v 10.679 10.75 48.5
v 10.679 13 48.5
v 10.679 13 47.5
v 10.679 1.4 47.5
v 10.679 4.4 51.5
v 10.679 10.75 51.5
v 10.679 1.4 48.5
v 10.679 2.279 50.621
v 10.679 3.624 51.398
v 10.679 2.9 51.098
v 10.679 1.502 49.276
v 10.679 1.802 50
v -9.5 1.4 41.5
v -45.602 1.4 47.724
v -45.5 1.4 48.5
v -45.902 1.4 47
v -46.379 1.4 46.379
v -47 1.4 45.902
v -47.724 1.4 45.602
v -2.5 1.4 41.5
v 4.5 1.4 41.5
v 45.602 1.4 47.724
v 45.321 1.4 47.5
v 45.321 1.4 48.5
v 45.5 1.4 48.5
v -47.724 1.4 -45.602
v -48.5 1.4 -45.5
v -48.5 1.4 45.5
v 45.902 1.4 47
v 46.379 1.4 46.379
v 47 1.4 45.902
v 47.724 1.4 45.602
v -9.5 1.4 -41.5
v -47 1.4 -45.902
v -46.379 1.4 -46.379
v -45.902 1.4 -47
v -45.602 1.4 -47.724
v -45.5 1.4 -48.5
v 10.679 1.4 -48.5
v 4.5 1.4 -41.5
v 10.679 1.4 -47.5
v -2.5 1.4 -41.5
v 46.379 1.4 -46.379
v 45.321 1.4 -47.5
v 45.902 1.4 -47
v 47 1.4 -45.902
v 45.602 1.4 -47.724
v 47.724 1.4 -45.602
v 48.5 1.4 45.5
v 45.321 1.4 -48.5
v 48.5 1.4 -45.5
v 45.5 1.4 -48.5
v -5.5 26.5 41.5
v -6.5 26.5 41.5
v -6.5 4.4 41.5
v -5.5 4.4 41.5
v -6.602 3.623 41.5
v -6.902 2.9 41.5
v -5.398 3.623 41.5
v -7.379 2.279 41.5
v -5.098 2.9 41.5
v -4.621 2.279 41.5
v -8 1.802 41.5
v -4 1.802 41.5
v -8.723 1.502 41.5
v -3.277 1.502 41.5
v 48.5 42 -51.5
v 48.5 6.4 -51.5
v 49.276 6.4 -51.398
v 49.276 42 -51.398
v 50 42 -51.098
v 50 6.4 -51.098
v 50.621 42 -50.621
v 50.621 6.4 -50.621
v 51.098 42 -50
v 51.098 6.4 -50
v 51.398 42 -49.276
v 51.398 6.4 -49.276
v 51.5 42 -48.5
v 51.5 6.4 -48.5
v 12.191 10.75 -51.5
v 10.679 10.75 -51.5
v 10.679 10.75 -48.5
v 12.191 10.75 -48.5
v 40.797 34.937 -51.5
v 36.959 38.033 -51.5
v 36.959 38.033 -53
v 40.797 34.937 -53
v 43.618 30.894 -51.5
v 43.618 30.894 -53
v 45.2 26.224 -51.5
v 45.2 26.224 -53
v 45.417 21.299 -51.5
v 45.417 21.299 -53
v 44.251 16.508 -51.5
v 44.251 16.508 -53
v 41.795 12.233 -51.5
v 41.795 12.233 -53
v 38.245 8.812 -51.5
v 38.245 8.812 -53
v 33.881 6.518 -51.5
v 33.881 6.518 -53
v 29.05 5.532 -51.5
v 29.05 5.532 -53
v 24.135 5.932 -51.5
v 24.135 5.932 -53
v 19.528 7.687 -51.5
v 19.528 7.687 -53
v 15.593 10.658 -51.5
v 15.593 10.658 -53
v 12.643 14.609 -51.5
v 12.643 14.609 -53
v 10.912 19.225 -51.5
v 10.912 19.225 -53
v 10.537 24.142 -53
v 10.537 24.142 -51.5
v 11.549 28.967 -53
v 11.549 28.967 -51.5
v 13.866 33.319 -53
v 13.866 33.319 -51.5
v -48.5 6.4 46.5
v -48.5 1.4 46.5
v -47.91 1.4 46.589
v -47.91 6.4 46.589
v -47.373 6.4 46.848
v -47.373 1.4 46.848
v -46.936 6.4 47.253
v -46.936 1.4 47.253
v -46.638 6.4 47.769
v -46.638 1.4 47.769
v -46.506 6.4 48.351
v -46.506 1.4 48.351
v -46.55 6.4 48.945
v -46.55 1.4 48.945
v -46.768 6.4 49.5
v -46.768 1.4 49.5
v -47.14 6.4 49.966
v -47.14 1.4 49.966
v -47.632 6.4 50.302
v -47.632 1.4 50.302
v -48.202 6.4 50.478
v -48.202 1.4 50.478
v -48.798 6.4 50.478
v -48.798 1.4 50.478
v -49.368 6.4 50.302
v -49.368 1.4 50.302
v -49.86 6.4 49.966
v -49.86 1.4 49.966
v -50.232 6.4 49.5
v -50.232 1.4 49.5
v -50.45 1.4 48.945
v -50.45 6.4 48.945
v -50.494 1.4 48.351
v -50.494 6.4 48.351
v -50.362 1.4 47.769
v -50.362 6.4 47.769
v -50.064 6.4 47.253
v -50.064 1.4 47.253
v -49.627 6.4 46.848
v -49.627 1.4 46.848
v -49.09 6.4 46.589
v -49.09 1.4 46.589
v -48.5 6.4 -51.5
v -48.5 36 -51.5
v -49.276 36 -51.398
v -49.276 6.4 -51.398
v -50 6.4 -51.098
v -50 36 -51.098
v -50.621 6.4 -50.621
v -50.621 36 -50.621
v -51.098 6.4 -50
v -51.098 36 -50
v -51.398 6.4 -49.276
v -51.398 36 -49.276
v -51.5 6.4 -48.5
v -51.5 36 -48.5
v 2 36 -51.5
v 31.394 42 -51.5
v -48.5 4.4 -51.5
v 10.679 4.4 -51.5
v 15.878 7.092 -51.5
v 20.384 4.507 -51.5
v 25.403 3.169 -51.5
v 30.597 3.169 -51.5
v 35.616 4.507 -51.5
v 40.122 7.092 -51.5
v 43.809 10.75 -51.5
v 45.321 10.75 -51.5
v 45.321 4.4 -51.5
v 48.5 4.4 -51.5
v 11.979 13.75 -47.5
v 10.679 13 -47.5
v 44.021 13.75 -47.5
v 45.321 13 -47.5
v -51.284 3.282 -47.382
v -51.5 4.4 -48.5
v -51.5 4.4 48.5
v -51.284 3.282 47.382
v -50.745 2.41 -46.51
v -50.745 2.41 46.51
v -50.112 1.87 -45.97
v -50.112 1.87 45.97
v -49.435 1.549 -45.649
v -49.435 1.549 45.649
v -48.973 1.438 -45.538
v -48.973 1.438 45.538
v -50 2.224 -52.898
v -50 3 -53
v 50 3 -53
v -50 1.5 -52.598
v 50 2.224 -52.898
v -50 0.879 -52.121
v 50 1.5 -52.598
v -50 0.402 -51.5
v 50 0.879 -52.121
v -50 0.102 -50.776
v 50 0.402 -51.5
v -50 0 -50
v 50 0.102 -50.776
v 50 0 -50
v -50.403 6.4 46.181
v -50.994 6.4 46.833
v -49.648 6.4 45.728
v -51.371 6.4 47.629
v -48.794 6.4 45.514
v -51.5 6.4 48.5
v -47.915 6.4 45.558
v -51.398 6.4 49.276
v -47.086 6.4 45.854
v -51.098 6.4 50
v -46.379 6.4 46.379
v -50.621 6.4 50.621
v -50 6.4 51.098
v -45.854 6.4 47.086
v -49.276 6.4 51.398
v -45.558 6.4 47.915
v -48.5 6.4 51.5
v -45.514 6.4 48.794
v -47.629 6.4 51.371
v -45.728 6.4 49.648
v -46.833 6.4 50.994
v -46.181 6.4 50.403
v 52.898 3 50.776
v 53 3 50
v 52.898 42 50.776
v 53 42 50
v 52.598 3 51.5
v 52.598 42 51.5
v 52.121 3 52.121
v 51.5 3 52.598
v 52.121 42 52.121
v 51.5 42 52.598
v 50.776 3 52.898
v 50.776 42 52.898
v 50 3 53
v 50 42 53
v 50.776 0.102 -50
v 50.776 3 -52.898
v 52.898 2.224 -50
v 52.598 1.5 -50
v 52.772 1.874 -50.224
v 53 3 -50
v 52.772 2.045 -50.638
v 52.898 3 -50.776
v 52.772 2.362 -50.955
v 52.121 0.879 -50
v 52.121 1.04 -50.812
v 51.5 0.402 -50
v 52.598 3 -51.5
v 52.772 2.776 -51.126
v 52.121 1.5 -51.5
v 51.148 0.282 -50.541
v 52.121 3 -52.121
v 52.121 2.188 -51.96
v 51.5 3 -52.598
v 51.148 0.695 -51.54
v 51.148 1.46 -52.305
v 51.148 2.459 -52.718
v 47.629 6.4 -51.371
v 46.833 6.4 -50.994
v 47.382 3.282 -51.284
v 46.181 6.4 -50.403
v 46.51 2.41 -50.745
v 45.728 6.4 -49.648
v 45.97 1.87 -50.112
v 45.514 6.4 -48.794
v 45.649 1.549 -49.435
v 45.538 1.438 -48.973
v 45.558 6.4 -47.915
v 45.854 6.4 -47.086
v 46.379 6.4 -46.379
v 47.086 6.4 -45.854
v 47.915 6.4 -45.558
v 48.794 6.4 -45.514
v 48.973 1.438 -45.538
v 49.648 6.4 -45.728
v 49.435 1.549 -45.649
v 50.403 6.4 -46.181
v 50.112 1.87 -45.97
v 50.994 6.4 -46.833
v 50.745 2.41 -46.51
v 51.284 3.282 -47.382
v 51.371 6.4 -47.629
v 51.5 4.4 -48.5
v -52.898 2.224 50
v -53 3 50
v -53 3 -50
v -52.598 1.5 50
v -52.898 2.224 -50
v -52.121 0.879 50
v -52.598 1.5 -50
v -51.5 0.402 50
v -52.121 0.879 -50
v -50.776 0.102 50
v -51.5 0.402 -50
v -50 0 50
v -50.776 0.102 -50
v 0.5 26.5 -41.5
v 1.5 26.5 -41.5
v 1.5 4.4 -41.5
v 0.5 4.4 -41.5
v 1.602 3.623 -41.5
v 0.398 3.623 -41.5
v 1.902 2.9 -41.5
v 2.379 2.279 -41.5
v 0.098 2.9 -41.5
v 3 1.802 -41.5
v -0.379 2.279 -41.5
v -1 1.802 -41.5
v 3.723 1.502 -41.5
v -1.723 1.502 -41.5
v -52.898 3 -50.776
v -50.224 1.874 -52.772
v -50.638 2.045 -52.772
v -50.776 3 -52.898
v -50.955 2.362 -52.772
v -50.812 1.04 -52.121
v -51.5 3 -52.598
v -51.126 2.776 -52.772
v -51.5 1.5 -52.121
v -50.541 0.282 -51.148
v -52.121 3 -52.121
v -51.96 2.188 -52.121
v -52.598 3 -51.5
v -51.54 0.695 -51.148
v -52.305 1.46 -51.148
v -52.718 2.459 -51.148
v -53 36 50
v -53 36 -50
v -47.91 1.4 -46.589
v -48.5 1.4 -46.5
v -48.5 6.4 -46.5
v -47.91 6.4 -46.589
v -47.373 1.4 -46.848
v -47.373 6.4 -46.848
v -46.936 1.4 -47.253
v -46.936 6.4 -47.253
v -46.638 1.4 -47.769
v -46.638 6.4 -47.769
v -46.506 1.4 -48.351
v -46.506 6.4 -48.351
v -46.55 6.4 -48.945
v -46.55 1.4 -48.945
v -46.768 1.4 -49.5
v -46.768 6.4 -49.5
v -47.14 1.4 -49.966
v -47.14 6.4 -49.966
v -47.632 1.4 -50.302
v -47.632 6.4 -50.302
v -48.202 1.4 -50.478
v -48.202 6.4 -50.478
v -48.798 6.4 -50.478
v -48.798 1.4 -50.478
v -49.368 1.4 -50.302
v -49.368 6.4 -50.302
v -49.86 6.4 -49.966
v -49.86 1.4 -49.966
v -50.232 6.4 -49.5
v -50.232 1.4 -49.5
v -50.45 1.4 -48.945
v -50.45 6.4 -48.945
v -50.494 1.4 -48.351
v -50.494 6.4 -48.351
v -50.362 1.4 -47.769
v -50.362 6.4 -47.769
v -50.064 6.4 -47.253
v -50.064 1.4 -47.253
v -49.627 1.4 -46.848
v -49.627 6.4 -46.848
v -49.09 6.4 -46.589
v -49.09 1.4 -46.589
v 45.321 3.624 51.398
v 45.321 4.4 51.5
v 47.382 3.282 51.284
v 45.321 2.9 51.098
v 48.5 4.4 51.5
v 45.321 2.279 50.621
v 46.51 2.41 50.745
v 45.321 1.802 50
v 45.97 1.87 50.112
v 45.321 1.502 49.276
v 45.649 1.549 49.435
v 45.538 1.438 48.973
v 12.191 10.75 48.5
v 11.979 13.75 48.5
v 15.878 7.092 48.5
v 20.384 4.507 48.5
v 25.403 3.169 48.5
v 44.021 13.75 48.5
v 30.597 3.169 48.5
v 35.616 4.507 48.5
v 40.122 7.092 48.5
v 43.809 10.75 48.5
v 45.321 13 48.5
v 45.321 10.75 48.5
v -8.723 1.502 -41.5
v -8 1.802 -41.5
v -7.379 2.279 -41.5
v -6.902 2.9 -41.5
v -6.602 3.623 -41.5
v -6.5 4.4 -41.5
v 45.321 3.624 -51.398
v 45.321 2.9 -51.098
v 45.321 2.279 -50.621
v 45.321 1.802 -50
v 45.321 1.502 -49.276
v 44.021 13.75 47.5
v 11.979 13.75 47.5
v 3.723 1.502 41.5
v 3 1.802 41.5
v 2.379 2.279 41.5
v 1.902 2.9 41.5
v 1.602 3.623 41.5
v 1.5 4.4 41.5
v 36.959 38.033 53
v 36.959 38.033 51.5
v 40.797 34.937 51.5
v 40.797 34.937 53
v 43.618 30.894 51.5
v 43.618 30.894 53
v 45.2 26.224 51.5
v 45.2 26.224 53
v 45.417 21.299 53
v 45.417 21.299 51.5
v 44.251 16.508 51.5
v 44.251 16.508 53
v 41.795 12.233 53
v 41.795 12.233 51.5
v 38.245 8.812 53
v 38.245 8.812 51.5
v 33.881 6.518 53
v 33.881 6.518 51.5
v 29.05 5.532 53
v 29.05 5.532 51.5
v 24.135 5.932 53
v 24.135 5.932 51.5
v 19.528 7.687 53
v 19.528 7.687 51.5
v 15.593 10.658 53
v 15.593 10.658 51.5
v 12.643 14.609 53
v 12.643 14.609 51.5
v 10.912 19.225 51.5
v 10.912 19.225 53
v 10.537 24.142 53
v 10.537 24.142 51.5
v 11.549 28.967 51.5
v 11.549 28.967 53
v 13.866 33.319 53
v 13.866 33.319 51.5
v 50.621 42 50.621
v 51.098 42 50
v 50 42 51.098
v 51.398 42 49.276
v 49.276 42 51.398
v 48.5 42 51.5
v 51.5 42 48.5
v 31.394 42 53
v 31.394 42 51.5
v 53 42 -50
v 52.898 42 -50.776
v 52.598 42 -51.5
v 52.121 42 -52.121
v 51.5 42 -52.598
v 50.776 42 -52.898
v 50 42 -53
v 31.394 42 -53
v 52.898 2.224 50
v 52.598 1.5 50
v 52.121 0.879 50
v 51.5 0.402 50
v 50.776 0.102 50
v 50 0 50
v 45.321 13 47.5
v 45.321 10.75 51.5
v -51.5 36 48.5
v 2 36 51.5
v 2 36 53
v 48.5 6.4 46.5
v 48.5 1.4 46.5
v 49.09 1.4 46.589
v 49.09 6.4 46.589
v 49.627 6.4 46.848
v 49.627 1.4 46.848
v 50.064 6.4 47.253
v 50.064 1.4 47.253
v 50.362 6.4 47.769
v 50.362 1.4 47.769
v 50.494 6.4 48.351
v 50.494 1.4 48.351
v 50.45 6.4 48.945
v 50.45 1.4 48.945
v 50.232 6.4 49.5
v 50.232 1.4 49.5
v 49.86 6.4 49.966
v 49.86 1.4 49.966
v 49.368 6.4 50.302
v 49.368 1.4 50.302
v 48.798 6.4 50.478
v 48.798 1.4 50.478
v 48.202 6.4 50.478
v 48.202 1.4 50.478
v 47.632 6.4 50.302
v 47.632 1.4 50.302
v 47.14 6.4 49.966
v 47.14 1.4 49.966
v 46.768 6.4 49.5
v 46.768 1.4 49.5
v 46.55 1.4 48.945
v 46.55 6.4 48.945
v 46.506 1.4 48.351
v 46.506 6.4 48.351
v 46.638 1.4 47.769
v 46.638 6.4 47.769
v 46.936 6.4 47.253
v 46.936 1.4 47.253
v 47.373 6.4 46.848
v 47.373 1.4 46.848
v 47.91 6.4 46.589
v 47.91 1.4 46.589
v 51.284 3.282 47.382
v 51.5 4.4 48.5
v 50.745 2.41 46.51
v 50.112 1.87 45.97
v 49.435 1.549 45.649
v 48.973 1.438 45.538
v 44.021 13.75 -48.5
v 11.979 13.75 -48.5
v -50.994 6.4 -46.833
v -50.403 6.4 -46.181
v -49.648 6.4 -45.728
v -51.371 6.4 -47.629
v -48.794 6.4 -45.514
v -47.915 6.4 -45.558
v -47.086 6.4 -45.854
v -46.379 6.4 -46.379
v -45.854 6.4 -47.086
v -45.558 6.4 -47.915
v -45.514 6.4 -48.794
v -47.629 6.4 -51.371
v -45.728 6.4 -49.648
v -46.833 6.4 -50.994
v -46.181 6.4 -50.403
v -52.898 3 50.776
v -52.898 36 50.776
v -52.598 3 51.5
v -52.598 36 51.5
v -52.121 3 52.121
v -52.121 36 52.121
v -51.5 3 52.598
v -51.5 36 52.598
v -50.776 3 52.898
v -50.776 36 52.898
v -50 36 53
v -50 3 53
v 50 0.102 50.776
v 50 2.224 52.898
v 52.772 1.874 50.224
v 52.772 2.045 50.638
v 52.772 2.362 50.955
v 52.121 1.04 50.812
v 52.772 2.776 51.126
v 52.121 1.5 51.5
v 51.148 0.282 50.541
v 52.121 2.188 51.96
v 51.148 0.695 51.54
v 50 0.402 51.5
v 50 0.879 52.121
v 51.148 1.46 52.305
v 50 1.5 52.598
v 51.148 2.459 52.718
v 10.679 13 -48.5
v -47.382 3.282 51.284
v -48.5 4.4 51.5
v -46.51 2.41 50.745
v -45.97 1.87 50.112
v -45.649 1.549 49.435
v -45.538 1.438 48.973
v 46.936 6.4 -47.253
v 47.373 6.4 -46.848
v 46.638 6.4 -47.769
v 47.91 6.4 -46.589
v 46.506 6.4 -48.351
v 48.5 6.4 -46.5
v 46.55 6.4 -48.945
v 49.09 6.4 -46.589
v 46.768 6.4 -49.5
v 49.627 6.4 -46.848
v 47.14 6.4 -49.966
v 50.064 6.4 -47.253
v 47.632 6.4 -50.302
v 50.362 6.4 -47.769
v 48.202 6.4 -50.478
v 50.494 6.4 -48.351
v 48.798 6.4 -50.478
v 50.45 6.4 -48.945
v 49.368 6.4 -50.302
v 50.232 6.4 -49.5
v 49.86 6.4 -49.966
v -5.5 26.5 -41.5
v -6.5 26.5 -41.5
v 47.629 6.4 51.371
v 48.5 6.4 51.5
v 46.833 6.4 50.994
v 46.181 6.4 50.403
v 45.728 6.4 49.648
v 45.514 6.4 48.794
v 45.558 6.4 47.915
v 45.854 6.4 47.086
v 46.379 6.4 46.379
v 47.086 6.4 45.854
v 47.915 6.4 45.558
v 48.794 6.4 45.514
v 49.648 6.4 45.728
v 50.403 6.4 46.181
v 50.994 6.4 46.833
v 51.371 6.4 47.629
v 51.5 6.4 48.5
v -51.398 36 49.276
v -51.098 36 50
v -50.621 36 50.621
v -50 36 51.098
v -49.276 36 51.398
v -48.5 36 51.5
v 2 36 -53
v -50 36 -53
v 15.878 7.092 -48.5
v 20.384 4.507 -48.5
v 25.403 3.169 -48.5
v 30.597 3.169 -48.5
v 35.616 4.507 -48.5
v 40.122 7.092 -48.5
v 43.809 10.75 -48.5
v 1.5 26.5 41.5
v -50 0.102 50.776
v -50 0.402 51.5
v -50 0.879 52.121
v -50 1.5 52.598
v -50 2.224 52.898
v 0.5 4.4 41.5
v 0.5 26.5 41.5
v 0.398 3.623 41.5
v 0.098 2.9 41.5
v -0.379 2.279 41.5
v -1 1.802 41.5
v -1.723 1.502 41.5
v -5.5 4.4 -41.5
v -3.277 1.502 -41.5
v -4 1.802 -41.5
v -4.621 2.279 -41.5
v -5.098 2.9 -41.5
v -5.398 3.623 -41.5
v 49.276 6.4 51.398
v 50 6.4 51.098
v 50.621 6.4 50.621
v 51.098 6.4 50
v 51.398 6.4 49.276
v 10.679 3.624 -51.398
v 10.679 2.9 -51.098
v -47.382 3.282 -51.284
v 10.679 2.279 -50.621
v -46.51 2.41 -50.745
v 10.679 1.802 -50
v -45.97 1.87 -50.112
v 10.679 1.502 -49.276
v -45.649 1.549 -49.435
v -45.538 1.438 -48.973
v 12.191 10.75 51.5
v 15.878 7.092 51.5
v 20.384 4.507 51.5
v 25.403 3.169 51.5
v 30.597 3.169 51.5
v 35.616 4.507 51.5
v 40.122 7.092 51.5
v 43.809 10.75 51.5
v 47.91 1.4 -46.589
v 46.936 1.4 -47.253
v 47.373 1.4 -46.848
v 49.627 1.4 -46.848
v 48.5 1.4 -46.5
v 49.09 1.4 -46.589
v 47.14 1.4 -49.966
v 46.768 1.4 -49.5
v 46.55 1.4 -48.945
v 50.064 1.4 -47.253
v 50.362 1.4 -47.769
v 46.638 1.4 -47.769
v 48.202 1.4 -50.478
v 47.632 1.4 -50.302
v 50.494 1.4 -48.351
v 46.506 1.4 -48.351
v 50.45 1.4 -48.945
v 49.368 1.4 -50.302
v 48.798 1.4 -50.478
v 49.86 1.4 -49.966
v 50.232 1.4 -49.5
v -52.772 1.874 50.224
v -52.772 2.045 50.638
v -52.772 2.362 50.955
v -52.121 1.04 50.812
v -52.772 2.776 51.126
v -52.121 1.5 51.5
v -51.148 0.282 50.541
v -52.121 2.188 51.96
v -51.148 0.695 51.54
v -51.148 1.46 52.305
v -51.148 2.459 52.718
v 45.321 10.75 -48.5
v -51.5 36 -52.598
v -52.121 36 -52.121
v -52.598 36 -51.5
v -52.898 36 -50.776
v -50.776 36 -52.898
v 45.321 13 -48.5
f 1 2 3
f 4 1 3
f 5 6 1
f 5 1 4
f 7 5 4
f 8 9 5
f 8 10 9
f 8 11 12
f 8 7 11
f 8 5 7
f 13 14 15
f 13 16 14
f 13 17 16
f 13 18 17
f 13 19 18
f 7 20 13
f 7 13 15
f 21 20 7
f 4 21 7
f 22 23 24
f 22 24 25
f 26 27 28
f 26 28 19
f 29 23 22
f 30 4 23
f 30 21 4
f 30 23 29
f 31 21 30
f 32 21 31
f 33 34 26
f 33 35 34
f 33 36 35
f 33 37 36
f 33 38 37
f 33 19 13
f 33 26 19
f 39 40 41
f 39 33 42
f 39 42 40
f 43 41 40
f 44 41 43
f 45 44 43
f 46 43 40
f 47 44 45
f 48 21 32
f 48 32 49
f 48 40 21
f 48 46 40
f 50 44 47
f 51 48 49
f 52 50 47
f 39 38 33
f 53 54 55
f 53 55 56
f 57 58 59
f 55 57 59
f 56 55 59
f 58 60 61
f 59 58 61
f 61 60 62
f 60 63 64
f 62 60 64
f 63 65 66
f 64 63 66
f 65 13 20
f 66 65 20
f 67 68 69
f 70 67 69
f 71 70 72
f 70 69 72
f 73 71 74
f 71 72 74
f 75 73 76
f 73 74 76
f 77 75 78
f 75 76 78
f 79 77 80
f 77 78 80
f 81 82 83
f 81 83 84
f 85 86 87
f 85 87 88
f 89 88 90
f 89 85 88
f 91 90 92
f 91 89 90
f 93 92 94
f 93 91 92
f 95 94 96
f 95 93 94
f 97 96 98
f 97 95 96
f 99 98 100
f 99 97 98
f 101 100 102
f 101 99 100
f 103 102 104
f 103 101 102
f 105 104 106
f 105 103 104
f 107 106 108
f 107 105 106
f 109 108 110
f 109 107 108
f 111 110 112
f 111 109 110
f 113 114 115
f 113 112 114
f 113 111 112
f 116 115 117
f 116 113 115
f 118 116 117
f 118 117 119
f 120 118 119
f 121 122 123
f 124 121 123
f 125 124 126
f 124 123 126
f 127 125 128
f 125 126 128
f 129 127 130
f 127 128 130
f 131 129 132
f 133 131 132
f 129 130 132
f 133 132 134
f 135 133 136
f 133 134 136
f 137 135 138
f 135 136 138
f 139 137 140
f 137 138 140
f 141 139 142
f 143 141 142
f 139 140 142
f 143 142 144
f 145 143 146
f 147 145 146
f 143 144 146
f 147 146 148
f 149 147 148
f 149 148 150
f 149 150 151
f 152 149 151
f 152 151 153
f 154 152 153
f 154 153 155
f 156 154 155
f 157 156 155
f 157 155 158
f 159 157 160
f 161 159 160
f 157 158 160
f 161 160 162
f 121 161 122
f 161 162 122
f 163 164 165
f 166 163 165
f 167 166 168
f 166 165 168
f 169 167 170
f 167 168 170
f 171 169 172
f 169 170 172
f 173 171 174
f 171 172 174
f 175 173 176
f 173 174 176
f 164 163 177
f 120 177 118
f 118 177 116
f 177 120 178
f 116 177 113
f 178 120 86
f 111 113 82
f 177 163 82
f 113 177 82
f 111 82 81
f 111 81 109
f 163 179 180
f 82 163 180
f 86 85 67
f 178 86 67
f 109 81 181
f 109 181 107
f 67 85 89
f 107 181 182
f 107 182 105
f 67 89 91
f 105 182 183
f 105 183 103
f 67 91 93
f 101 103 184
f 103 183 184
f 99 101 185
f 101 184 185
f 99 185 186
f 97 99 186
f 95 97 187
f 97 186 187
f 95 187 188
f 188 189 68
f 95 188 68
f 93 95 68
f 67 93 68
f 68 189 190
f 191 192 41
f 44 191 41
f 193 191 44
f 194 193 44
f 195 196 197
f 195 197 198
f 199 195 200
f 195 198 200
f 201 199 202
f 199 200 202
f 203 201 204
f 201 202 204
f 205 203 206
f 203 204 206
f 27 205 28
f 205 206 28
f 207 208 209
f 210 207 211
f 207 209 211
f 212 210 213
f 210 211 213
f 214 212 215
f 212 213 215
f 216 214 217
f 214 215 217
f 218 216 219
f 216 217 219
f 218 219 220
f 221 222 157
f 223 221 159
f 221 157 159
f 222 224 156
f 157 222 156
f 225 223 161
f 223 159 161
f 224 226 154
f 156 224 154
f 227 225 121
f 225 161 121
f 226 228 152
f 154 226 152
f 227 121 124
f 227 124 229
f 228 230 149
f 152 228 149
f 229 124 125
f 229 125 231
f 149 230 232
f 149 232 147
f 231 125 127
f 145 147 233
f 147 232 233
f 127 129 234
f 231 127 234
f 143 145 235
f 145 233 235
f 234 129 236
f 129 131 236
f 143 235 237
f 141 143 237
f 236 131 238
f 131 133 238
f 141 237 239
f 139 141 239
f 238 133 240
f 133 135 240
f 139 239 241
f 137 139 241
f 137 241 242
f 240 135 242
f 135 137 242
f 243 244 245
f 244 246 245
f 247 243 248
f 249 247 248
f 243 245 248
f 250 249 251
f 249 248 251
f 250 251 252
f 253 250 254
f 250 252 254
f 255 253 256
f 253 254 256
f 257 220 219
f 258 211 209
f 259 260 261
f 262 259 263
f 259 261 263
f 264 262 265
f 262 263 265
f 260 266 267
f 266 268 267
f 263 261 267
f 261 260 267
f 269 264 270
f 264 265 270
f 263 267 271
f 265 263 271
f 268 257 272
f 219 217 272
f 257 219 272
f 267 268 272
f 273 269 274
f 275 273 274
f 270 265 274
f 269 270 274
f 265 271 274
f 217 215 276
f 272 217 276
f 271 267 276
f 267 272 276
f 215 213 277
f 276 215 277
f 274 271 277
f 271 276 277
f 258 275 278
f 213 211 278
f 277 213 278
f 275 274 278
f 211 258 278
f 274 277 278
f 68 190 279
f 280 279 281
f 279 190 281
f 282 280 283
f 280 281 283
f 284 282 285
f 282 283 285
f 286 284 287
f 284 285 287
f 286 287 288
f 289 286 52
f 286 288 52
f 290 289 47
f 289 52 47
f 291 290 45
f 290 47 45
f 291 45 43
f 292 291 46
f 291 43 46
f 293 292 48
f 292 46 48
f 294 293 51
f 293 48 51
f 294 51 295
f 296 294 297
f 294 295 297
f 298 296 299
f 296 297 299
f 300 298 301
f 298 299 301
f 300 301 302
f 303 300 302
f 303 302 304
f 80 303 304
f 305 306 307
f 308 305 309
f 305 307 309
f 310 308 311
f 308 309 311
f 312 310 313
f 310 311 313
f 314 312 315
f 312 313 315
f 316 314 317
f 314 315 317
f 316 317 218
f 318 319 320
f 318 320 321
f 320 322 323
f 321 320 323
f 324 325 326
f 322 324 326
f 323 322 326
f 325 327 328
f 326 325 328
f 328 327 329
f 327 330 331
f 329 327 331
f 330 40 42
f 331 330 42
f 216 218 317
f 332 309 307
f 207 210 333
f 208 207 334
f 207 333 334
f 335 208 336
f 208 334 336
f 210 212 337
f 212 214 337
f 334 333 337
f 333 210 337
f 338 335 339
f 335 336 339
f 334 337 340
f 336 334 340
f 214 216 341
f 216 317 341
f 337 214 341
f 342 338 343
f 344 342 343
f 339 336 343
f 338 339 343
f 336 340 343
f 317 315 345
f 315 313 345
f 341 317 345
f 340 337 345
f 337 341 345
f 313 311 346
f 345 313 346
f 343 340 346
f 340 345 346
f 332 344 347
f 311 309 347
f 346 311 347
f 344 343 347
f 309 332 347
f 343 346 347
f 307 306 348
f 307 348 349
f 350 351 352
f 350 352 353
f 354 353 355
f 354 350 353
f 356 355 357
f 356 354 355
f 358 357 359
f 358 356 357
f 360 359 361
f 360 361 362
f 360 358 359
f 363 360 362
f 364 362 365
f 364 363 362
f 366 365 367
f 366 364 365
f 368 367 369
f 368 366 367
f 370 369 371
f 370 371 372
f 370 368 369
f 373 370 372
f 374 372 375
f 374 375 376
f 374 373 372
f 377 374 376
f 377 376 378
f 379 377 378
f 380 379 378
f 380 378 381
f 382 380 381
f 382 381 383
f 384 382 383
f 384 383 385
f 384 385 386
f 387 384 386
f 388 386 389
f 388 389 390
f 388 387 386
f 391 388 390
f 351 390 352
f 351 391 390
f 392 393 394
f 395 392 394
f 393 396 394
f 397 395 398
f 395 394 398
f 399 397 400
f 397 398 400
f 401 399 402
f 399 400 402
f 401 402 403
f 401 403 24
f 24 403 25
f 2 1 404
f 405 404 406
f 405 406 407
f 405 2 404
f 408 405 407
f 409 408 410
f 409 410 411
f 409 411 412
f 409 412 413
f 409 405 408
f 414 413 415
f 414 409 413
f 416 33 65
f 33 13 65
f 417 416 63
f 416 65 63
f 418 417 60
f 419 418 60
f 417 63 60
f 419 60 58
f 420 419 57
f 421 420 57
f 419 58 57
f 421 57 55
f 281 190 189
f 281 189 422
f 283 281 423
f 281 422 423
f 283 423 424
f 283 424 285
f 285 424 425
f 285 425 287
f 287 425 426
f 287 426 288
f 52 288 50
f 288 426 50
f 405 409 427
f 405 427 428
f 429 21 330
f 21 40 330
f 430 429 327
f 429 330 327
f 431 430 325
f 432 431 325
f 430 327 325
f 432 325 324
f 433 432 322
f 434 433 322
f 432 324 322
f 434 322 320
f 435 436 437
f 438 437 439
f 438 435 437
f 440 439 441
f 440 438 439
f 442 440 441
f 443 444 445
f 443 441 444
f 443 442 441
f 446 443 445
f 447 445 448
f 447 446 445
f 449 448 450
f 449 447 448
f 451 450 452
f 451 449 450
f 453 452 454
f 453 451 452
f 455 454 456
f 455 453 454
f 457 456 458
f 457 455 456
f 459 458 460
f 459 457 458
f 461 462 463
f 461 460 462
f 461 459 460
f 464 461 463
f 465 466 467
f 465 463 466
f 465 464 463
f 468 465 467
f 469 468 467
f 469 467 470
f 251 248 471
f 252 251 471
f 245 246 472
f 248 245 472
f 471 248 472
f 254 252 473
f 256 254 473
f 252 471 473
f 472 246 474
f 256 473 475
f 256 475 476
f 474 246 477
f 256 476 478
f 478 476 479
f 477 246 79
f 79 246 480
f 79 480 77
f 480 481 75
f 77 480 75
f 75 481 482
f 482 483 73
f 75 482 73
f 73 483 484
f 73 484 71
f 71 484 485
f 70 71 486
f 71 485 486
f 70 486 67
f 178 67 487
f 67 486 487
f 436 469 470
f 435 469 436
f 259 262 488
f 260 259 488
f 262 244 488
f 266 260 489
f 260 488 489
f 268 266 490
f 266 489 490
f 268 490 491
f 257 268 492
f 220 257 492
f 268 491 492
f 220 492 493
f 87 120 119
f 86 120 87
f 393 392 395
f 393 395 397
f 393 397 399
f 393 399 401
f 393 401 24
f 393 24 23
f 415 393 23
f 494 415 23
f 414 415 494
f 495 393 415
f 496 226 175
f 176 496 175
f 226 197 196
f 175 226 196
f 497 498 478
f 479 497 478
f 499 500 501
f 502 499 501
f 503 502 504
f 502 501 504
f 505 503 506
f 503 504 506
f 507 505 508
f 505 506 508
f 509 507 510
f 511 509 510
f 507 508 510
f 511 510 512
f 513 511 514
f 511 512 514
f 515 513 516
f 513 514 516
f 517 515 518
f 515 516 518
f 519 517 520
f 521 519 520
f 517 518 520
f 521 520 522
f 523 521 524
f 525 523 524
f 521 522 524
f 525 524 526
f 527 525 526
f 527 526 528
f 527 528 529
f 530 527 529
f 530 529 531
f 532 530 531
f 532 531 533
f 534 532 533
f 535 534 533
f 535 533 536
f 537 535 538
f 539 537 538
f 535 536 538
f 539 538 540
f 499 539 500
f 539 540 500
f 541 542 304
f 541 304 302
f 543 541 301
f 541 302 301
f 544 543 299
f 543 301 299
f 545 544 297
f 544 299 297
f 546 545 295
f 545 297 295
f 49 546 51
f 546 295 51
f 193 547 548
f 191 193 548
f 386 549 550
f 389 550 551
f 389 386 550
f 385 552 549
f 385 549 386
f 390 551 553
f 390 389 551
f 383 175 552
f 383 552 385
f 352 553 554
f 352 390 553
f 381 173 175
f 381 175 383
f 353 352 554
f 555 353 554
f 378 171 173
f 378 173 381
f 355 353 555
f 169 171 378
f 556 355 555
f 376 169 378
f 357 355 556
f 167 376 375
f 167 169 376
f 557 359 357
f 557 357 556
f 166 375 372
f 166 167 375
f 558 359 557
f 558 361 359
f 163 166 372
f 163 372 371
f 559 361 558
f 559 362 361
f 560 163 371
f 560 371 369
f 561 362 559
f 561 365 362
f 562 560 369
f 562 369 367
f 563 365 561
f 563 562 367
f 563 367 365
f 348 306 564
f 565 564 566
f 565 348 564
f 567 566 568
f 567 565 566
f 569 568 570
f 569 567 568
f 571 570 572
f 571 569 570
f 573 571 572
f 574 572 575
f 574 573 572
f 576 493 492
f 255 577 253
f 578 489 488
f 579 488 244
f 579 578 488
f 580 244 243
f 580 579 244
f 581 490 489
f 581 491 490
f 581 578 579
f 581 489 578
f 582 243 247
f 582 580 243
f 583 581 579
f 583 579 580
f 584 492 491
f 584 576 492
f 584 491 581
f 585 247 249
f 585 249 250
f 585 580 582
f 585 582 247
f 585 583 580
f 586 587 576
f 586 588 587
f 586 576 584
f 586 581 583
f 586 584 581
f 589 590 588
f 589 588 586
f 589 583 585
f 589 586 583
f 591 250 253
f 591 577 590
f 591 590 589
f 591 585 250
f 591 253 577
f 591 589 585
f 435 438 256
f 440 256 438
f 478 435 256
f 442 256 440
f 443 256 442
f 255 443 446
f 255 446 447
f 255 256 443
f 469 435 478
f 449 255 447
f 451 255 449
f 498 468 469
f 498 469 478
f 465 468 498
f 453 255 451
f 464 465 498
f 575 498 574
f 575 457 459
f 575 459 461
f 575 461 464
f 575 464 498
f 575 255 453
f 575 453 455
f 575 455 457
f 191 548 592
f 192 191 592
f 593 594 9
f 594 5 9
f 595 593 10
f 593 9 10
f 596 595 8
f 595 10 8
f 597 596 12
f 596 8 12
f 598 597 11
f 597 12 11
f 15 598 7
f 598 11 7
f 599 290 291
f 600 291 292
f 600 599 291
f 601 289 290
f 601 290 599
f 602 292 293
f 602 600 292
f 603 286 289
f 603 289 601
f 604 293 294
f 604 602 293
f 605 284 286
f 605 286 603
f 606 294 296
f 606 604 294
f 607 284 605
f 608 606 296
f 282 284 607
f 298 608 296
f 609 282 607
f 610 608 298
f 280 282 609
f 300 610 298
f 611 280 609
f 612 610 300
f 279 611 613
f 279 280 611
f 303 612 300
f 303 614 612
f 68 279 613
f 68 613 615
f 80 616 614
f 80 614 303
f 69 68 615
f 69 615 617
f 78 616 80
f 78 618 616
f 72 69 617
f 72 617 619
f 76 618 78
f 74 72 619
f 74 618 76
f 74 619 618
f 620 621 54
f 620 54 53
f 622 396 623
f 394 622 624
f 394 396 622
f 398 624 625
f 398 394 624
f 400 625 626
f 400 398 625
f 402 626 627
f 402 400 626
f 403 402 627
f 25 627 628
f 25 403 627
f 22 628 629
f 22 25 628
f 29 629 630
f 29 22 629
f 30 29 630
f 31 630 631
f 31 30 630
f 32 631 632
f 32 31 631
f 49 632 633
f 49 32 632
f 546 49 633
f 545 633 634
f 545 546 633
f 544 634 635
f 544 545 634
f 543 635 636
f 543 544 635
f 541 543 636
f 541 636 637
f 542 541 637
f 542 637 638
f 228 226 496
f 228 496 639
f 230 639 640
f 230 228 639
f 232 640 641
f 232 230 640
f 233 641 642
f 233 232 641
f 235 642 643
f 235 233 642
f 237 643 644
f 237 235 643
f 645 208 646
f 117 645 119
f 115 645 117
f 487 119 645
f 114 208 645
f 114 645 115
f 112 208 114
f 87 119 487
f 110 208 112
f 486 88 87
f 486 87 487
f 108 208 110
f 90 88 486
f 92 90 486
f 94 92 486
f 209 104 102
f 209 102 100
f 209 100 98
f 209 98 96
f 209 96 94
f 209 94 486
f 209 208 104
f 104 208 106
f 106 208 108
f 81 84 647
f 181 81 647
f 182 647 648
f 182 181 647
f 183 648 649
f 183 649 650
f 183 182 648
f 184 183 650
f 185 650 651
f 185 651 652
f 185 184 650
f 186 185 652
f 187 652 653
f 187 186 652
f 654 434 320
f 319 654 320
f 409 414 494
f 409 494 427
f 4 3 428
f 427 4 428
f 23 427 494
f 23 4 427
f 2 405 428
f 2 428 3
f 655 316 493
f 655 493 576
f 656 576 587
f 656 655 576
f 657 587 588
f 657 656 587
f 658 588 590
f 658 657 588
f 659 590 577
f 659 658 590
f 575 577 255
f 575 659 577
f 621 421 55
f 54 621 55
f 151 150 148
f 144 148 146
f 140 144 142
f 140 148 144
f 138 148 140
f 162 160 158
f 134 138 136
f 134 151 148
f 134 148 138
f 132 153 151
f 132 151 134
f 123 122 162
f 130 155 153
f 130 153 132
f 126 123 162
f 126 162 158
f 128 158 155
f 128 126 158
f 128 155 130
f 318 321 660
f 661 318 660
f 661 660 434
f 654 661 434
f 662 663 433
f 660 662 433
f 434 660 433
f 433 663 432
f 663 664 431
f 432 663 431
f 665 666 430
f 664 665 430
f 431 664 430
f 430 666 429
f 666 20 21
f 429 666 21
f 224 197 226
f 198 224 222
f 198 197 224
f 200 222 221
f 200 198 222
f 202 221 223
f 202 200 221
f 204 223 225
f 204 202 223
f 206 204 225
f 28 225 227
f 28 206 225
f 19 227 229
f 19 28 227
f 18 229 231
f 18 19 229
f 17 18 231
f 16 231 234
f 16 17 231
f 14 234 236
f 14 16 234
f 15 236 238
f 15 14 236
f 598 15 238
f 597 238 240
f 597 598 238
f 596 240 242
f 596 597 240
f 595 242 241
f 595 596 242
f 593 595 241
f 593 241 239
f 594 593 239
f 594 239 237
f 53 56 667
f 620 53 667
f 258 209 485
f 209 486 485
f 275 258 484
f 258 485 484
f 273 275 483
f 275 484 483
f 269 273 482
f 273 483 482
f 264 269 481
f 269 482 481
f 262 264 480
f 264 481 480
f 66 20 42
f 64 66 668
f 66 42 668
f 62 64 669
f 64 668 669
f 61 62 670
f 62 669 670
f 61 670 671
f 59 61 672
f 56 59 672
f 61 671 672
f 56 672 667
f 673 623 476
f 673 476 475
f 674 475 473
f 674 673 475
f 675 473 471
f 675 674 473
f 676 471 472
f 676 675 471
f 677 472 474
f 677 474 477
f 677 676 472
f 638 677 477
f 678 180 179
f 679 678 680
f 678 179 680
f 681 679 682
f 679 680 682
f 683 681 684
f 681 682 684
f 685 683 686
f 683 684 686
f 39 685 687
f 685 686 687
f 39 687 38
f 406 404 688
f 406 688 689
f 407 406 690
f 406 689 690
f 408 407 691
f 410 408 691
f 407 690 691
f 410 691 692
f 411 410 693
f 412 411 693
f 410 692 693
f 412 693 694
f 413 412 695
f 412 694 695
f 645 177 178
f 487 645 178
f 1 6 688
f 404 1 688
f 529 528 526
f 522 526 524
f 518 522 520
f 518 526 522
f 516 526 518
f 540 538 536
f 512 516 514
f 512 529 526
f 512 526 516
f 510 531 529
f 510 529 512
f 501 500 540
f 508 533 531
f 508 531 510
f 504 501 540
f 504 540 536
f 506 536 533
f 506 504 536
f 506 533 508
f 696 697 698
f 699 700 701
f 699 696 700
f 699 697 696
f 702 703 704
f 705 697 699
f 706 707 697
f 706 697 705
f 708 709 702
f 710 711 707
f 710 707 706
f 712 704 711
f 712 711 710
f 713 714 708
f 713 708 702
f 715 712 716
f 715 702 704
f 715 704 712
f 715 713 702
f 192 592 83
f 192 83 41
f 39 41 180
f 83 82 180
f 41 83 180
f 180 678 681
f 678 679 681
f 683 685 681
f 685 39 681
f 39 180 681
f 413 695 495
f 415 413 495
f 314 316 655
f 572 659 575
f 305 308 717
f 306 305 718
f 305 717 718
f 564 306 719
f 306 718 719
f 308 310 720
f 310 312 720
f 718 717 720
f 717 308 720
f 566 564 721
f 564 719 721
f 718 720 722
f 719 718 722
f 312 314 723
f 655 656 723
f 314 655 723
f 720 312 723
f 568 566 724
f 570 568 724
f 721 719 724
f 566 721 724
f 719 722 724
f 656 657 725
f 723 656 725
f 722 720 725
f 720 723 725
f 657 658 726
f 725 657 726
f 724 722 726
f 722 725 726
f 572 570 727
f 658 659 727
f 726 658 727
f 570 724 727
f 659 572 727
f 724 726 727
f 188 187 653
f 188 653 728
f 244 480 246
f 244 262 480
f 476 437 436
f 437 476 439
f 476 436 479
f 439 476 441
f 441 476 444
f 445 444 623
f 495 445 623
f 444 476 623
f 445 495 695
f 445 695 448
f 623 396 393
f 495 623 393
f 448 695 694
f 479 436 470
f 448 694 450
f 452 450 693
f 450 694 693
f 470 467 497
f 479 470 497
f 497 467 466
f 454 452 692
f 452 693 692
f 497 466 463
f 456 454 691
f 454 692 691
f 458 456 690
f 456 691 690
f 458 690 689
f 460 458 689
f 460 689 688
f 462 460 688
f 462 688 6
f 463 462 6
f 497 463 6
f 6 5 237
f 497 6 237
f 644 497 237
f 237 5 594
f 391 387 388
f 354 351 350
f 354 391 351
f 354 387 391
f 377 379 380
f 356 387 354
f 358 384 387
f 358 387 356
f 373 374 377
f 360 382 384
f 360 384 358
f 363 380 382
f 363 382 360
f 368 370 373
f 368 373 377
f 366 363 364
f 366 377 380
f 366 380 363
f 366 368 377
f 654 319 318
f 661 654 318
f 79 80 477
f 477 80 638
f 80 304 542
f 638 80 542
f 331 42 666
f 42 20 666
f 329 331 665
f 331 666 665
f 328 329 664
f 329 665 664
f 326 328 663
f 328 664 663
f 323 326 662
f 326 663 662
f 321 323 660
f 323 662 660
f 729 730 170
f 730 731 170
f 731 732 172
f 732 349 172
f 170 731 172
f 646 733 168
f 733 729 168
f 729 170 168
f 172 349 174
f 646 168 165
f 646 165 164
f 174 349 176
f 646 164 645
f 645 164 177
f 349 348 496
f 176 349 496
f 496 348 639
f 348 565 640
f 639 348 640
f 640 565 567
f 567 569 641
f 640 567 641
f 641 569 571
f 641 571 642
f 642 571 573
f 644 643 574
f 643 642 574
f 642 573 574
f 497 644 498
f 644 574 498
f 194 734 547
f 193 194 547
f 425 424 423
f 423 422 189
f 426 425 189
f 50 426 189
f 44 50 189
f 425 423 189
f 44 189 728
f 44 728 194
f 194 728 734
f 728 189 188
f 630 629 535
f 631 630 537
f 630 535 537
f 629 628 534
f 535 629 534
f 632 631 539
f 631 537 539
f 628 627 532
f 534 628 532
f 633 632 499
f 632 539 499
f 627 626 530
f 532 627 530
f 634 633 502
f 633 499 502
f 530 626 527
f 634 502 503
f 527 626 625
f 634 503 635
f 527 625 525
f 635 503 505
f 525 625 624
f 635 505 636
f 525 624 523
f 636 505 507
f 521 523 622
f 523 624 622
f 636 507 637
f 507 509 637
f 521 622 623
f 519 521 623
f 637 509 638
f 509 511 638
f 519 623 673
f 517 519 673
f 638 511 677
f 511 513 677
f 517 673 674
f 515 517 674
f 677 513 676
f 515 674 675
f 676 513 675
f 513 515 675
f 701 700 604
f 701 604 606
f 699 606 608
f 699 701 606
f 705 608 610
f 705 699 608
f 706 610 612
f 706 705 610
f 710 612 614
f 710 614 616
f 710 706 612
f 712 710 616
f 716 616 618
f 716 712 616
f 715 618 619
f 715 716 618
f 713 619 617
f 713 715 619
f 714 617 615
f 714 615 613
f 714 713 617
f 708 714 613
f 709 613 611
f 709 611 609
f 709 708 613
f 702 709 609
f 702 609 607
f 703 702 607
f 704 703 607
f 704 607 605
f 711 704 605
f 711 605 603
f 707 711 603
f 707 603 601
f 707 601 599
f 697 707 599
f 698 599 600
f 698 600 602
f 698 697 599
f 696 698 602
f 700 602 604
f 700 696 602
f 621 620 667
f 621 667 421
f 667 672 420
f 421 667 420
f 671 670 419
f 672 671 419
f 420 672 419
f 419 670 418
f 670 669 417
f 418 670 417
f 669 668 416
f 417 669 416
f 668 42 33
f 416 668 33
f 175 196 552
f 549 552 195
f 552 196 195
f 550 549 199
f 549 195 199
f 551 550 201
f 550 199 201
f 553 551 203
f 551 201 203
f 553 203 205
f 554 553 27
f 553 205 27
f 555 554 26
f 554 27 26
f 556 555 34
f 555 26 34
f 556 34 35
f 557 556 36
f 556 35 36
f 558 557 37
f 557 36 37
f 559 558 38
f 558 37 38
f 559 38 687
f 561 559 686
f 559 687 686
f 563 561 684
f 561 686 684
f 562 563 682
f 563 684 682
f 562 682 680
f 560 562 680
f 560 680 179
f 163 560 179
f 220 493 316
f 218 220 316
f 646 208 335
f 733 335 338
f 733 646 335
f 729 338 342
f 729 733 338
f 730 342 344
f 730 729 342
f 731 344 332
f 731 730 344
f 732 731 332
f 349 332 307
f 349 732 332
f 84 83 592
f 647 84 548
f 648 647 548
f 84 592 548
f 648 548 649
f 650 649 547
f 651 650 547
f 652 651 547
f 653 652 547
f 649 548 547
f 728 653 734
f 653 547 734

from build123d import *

# Parameters (mm, degrees)
EXTRUDE_1_DEPTH      = 42
SHELL_1_T            = -1.5
EXTRUDE_4_DEPTH      = 25
FILLET_2_R           = 3
CUT_EXTRUDE_3_DEPTH  = 126.73384588089242
CUT_EXTRUDE_4_DEPTH  = 126.73384588089242
EXTRUDE_5_DEPTH      = 4
CUT_EXTRUDE_7_DEPTH  = 3
CUT_EXTRUDE_START    = -0.1
CUT_EXTRUDE_12_DEPTH = 0.1
SKETCH_18_R          = 3.0000000000000018
SKETCH_18_R_2        = 2.0000000000000036
EXTRUDE_6_DEPTH      = 5
FILLET_3_R           = 3
SKETCH_22_W          = 3
SKETCH_22_H          = 3.000000000000014
CUT_EXTRUDE_13_DEPTH = 3
SKETCH_23_W          = 3.000000000000007
SKETCH_23_H          = 3.000000000000014
CUT_EXTRUDE_14_DEPTH = 3
FILLET_4_R           = 3


with BuildPart() as part:
    # 草图1 → 凸台-拉伸1 (new body)
    with BuildSketch(Plane(origin=(0, 0, 0), x_dir=(1, 0, 0), z_dir=(0, 1, 0))):
        Polygon((-53.000000000000014, 53), (52.999999999999986, 53), (53, -53), (-53, -53), align=None)
    extrude(amount=EXTRUDE_1_DEPTH)

    # 抽壳1
    shell_1_openings = [part.faces().sort_by_distance(p)[0] for p in [
        (0, 42, 0),
    ]]
    offset(amount=SHELL_1_T, openings=shell_1_openings, kind=Kind.INTERSECTION)

    # 草图3 → 凸台-拉伸4 (add)
    with BuildSketch(Plane(origin=(0, 1.5, 0), x_dir=(1, 0, 0), z_dir=(0, 1, 0))):
        Polygon((-6.500000000000012, 41.49999999999999), (-6.500000000000003, -41.49999999999999), (-5.500000000000003, -41.49999999999999), (-5.5000000000000036, 41.49999999999999), align=None)
        Polygon((1.4999999999999944, 41.49999999999999), (1.5000000000000053, -41.49999999999999), (0.5000000000000043, -41.49999999999999), (0.4999999999999944, 41.49999999999999), align=None)
    extrude(amount=EXTRUDE_4_DEPTH)

    # 圆角2
    fillet_2_edges = [part.edges().sort_by_distance(p)[0] for p in [
        (51.5, 21.75, 51.5),
        (51.499999999999986, 21.75, -51.5),
        (-51.500000000000014, 21.75, -51.5),
        (-51.5, 21.75, 51.5),
        (0, 0, 53),
        (-53.00000000000001, 0, 0),
        (-1.421e-14, 0, -53),
        (52.99999999999999, 0, 0),
        (53, 21, 53),
        (-53, 21, 53),
        (-53.000000000000014, 21, -53),
        (52.999999999999986, 21, -53),
    ]]
    fillet(fillet_2_edges, radius=FILLET_2_R)

    # 草图6 → 切除-拉伸3 (cut, through all)
    with BuildSketch(Plane.XY.offset(53)):
        Polygon((-53, 36.00000000000001), (2.0000000000000018, 36.00000000000001), (31.393876913398135, 42), (-53, 42), align=None)
    extrude(amount=-CUT_EXTRUDE_3_DEPTH, mode=Mode.SUBTRACT)

    # 草图7 → 切除-拉伸4 (cut, through all)
    with BuildSketch(Plane.XY.offset(53)):
        with BuildLine():
            Line((13.866100098640908, 33.319053909073325), (36.958961236370065, 38.032864449771985))
            ThreePointArc((36.958961236370065, 38.032864449771985), (31.499999999999993, 5.853571800517756), (13.866100098640908, 33.319053909073325))
        make_face()
    extrude(amount=-CUT_EXTRUDE_4_DEPTH, mode=Mode.SUBTRACT)

    # 草图8 → 凸台-拉伸5 (add)
    with BuildSketch(Plane(origin=(0, 0, 51.5), x_dir=(-1, 0, 0), z_dir=(0, 0, -1))):
        Polygon((-45.32050807568879, 13.00000000000003), (-44.021469970012134, 13.750000000000028), (-11.978530029987853, 13.750000000000032), (-10.679491924311197, 13.000000000000034), (-10.679491924311197, 1.5000000000000053), (-45.32050807568879, 1.5000000000000009), align=None)
    extrude_5 = extrude(amount=EXTRUDE_5_DEPTH)

    # 草图10 → 切除-拉伸7 (cut)
    with BuildSketch(Plane(origin=(0, 0, 51.5), x_dir=(-1, 0, 0), z_dir=(0, 0, -1))):
        with BuildLine():
            Line((-45.3205080756888, 13.000000000000043), (-27.999999999999996, 23))
            Line((-27.999999999999996, 23), (-10.679491924311197, 13.000000000000043))
            ThreePointArc((-10.679491924311197, 13.000000000000043), (-28, 2.9999999999999964), (-45.3205080756888, 13.000000000000043))
        make_face()
    cut_extrude_7 = extrude(amount=CUT_EXTRUDE_7_DEPTH, mode=Mode.SUBTRACT)

    # 镜向1: 凸台-拉伸5, 切除-拉伸7 across plane
    add(extrude_5.mirror(Plane.XY))
    add(cut_extrude_7.mirror(Plane.XY), mode=Mode.SUBTRACT)

    # 草图17 → 切除-拉伸12 (cut)
    with BuildSketch(Plane(origin=(0, 1.5, 0), x_dir=(1, 0, 0), z_dir=(0, 1, 0)).offset(CUT_EXTRUDE_START)):
        with BuildLine():
            Line((10.679491924311197, 47.5), (10.679491924311197, 51.5))
            Line((10.679491924311197, 51.5), (-48.50000000000001, 51.5))
            ThreePointArc((-48.50000000000001, 51.5), (-50.62132034355965, 50.62132034355964), (-51.500000000000014, 48.49999999999999))
            Line((-51.500000000000014, 48.49999999999999), (-51.5, -48.49999999999999))
            ThreePointArc((-51.5, -48.49999999999999), (-50.62132034355964, -50.62132034355964), (-48.49999999999999, -51.5))
            Line((-48.49999999999999, -51.5), (10.679491924311197, -51.5))
            Line((10.679491924311197, -51.5), (10.679491924311197, -47.5))
            Line((10.679491924311197, -47.5), (45.32050807568879, -47.5))
            Line((45.32050807568879, -47.5), (45.32050807568879, -51.5))
            Line((45.32050807568879, -51.5), (48.49999999999999, -51.5))
            ThreePointArc((48.49999999999999, -51.5), (50.62132034355964, -50.62132034355964), (51.5, -48.49999999999999))
            Line((51.5, -48.49999999999999), (51.499999999999986, 48.49999999999999))
            ThreePointArc((51.499999999999986, 48.49999999999999), (50.621320343559624, 50.62132034355964), (48.49999999999998, 51.5))
            Line((48.49999999999998, 51.5), (45.32050807568879, 51.5))
            Line((45.32050807568879, 51.5), (45.32050807568879, 47.5))
            Line((45.32050807568879, 47.5), (10.679491924311197, 47.5))
        make_face()
        Polygon((1.4999999999999944, 41.49999999999999), (0.4999999999999944, 41.49999999999999), (0.5000000000000043, -41.49999999999999), (1.5000000000000053, -41.49999999999999), align=None, mode=Mode.SUBTRACT)
        Polygon((-5.5000000000000036, 41.49999999999999), (-6.500000000000012, 41.49999999999999), (-6.500000000000003, -41.49999999999999), (-5.500000000000003, -41.49999999999999), align=None, mode=Mode.SUBTRACT)
    extrude(amount=CUT_EXTRUDE_12_DEPTH, mode=Mode.SUBTRACT)

    # 草图18 → 凸台-拉伸6 (add)
    # profile 1 of 2: a face of its own
    with BuildSketch(Plane(origin=(0, 1.4, 0), x_dir=(1, 0, 0), z_dir=(0, 1, 0))):
        with Locations((-48.50000000000001, 48.49999999999999)):
            Circle(SKETCH_18_R)
        with Locations(Location((-48.50000000000001, 48.49999999999999, 0), (0, 0, 270))):
            Circle(SKETCH_18_R_2, mode=Mode.SUBTRACT)
    # profile 2 of 2: a face of its own
    with BuildSketch(Plane(origin=(0, 1.4, 0), x_dir=(1, 0, 0), z_dir=(0, 1, 0))):
        with Locations((48.49999999999998, 48.49999999999999)):
            Circle(SKETCH_18_R)
        with Locations(Location((48.49999999999998, 48.49999999999999, 0), (0, 0, 270))):
            Circle(SKETCH_18_R_2, mode=Mode.SUBTRACT)
    extrude_6 = extrude(amount=EXTRUDE_6_DEPTH)

    # 镜向2: 凸台-拉伸6 across plane
    add(extrude_6.mirror(Plane.XY))

    # 圆角3
    fillet_3_edges = [part.edges().sort_by_distance(p)[0] for p in [
        (46.91025403784438, 1.4, -51.5),
        (51.49999999999999, 1.4, 0),
        (46.910254037844396, 1.4, 51.5),
        (-18.910254037844396, 1.4, 51.5),
        (-51.50000000000001, 1.4, 0),
        (-18.910254037844407, 1.4, -51.5),
    ]]
    fillet(fillet_3_edges, radius=FILLET_3_R)

    # 草图22 → 切除-拉伸13 (cut)
    with BuildSketch(Plane(origin=(1.49e-15, 13.750000000000034, 0), x_dir=(1, -1.1e-16, 0), z_dir=(1.1e-16, 1, 0))):
        with Locations((12.179491924311202, 50)):
            Rectangle(SKETCH_22_W, SKETCH_22_H)
    cut_extrude_13 = extrude(amount=-CUT_EXTRUDE_13_DEPTH, mode=Mode.SUBTRACT)

    # 草图23 → 切除-拉伸14 (cut)
    with BuildSketch(Plane(origin=(1.49e-15, 13.750000000000034, 0), x_dir=(1, -1.1e-16, 0), z_dir=(1.1e-16, 1, 0))):
        with Locations((43.82050807568879, 50)):
            Rectangle(SKETCH_23_W, SKETCH_23_H)
    cut_extrude_14 = extrude(amount=-CUT_EXTRUDE_14_DEPTH, mode=Mode.SUBTRACT)

    # 镜向3: 切除-拉伸13, 切除-拉伸14 across plane
    add(cut_extrude_13.mirror(Plane.XY), mode=Mode.SUBTRACT)
    add(cut_extrude_14.mirror(Plane.XY), mode=Mode.SUBTRACT)

    # 圆角4
    fillet_4_edges = [part.edges().sort_by_distance(p)[0] for p in [
        (-5.5000000000000036, 1.4, 0),
        (-6.500000000000008, 1.4, 0),
        (1.5, 1.4, 0),
        (0.49999999999999933, 1.4, 0),
    ]]
    fillet(fillet_4_edges, radius=FILLET_4_R - 0.0001)  # a hair under: the kernel refuses the full size


solid = part.part
